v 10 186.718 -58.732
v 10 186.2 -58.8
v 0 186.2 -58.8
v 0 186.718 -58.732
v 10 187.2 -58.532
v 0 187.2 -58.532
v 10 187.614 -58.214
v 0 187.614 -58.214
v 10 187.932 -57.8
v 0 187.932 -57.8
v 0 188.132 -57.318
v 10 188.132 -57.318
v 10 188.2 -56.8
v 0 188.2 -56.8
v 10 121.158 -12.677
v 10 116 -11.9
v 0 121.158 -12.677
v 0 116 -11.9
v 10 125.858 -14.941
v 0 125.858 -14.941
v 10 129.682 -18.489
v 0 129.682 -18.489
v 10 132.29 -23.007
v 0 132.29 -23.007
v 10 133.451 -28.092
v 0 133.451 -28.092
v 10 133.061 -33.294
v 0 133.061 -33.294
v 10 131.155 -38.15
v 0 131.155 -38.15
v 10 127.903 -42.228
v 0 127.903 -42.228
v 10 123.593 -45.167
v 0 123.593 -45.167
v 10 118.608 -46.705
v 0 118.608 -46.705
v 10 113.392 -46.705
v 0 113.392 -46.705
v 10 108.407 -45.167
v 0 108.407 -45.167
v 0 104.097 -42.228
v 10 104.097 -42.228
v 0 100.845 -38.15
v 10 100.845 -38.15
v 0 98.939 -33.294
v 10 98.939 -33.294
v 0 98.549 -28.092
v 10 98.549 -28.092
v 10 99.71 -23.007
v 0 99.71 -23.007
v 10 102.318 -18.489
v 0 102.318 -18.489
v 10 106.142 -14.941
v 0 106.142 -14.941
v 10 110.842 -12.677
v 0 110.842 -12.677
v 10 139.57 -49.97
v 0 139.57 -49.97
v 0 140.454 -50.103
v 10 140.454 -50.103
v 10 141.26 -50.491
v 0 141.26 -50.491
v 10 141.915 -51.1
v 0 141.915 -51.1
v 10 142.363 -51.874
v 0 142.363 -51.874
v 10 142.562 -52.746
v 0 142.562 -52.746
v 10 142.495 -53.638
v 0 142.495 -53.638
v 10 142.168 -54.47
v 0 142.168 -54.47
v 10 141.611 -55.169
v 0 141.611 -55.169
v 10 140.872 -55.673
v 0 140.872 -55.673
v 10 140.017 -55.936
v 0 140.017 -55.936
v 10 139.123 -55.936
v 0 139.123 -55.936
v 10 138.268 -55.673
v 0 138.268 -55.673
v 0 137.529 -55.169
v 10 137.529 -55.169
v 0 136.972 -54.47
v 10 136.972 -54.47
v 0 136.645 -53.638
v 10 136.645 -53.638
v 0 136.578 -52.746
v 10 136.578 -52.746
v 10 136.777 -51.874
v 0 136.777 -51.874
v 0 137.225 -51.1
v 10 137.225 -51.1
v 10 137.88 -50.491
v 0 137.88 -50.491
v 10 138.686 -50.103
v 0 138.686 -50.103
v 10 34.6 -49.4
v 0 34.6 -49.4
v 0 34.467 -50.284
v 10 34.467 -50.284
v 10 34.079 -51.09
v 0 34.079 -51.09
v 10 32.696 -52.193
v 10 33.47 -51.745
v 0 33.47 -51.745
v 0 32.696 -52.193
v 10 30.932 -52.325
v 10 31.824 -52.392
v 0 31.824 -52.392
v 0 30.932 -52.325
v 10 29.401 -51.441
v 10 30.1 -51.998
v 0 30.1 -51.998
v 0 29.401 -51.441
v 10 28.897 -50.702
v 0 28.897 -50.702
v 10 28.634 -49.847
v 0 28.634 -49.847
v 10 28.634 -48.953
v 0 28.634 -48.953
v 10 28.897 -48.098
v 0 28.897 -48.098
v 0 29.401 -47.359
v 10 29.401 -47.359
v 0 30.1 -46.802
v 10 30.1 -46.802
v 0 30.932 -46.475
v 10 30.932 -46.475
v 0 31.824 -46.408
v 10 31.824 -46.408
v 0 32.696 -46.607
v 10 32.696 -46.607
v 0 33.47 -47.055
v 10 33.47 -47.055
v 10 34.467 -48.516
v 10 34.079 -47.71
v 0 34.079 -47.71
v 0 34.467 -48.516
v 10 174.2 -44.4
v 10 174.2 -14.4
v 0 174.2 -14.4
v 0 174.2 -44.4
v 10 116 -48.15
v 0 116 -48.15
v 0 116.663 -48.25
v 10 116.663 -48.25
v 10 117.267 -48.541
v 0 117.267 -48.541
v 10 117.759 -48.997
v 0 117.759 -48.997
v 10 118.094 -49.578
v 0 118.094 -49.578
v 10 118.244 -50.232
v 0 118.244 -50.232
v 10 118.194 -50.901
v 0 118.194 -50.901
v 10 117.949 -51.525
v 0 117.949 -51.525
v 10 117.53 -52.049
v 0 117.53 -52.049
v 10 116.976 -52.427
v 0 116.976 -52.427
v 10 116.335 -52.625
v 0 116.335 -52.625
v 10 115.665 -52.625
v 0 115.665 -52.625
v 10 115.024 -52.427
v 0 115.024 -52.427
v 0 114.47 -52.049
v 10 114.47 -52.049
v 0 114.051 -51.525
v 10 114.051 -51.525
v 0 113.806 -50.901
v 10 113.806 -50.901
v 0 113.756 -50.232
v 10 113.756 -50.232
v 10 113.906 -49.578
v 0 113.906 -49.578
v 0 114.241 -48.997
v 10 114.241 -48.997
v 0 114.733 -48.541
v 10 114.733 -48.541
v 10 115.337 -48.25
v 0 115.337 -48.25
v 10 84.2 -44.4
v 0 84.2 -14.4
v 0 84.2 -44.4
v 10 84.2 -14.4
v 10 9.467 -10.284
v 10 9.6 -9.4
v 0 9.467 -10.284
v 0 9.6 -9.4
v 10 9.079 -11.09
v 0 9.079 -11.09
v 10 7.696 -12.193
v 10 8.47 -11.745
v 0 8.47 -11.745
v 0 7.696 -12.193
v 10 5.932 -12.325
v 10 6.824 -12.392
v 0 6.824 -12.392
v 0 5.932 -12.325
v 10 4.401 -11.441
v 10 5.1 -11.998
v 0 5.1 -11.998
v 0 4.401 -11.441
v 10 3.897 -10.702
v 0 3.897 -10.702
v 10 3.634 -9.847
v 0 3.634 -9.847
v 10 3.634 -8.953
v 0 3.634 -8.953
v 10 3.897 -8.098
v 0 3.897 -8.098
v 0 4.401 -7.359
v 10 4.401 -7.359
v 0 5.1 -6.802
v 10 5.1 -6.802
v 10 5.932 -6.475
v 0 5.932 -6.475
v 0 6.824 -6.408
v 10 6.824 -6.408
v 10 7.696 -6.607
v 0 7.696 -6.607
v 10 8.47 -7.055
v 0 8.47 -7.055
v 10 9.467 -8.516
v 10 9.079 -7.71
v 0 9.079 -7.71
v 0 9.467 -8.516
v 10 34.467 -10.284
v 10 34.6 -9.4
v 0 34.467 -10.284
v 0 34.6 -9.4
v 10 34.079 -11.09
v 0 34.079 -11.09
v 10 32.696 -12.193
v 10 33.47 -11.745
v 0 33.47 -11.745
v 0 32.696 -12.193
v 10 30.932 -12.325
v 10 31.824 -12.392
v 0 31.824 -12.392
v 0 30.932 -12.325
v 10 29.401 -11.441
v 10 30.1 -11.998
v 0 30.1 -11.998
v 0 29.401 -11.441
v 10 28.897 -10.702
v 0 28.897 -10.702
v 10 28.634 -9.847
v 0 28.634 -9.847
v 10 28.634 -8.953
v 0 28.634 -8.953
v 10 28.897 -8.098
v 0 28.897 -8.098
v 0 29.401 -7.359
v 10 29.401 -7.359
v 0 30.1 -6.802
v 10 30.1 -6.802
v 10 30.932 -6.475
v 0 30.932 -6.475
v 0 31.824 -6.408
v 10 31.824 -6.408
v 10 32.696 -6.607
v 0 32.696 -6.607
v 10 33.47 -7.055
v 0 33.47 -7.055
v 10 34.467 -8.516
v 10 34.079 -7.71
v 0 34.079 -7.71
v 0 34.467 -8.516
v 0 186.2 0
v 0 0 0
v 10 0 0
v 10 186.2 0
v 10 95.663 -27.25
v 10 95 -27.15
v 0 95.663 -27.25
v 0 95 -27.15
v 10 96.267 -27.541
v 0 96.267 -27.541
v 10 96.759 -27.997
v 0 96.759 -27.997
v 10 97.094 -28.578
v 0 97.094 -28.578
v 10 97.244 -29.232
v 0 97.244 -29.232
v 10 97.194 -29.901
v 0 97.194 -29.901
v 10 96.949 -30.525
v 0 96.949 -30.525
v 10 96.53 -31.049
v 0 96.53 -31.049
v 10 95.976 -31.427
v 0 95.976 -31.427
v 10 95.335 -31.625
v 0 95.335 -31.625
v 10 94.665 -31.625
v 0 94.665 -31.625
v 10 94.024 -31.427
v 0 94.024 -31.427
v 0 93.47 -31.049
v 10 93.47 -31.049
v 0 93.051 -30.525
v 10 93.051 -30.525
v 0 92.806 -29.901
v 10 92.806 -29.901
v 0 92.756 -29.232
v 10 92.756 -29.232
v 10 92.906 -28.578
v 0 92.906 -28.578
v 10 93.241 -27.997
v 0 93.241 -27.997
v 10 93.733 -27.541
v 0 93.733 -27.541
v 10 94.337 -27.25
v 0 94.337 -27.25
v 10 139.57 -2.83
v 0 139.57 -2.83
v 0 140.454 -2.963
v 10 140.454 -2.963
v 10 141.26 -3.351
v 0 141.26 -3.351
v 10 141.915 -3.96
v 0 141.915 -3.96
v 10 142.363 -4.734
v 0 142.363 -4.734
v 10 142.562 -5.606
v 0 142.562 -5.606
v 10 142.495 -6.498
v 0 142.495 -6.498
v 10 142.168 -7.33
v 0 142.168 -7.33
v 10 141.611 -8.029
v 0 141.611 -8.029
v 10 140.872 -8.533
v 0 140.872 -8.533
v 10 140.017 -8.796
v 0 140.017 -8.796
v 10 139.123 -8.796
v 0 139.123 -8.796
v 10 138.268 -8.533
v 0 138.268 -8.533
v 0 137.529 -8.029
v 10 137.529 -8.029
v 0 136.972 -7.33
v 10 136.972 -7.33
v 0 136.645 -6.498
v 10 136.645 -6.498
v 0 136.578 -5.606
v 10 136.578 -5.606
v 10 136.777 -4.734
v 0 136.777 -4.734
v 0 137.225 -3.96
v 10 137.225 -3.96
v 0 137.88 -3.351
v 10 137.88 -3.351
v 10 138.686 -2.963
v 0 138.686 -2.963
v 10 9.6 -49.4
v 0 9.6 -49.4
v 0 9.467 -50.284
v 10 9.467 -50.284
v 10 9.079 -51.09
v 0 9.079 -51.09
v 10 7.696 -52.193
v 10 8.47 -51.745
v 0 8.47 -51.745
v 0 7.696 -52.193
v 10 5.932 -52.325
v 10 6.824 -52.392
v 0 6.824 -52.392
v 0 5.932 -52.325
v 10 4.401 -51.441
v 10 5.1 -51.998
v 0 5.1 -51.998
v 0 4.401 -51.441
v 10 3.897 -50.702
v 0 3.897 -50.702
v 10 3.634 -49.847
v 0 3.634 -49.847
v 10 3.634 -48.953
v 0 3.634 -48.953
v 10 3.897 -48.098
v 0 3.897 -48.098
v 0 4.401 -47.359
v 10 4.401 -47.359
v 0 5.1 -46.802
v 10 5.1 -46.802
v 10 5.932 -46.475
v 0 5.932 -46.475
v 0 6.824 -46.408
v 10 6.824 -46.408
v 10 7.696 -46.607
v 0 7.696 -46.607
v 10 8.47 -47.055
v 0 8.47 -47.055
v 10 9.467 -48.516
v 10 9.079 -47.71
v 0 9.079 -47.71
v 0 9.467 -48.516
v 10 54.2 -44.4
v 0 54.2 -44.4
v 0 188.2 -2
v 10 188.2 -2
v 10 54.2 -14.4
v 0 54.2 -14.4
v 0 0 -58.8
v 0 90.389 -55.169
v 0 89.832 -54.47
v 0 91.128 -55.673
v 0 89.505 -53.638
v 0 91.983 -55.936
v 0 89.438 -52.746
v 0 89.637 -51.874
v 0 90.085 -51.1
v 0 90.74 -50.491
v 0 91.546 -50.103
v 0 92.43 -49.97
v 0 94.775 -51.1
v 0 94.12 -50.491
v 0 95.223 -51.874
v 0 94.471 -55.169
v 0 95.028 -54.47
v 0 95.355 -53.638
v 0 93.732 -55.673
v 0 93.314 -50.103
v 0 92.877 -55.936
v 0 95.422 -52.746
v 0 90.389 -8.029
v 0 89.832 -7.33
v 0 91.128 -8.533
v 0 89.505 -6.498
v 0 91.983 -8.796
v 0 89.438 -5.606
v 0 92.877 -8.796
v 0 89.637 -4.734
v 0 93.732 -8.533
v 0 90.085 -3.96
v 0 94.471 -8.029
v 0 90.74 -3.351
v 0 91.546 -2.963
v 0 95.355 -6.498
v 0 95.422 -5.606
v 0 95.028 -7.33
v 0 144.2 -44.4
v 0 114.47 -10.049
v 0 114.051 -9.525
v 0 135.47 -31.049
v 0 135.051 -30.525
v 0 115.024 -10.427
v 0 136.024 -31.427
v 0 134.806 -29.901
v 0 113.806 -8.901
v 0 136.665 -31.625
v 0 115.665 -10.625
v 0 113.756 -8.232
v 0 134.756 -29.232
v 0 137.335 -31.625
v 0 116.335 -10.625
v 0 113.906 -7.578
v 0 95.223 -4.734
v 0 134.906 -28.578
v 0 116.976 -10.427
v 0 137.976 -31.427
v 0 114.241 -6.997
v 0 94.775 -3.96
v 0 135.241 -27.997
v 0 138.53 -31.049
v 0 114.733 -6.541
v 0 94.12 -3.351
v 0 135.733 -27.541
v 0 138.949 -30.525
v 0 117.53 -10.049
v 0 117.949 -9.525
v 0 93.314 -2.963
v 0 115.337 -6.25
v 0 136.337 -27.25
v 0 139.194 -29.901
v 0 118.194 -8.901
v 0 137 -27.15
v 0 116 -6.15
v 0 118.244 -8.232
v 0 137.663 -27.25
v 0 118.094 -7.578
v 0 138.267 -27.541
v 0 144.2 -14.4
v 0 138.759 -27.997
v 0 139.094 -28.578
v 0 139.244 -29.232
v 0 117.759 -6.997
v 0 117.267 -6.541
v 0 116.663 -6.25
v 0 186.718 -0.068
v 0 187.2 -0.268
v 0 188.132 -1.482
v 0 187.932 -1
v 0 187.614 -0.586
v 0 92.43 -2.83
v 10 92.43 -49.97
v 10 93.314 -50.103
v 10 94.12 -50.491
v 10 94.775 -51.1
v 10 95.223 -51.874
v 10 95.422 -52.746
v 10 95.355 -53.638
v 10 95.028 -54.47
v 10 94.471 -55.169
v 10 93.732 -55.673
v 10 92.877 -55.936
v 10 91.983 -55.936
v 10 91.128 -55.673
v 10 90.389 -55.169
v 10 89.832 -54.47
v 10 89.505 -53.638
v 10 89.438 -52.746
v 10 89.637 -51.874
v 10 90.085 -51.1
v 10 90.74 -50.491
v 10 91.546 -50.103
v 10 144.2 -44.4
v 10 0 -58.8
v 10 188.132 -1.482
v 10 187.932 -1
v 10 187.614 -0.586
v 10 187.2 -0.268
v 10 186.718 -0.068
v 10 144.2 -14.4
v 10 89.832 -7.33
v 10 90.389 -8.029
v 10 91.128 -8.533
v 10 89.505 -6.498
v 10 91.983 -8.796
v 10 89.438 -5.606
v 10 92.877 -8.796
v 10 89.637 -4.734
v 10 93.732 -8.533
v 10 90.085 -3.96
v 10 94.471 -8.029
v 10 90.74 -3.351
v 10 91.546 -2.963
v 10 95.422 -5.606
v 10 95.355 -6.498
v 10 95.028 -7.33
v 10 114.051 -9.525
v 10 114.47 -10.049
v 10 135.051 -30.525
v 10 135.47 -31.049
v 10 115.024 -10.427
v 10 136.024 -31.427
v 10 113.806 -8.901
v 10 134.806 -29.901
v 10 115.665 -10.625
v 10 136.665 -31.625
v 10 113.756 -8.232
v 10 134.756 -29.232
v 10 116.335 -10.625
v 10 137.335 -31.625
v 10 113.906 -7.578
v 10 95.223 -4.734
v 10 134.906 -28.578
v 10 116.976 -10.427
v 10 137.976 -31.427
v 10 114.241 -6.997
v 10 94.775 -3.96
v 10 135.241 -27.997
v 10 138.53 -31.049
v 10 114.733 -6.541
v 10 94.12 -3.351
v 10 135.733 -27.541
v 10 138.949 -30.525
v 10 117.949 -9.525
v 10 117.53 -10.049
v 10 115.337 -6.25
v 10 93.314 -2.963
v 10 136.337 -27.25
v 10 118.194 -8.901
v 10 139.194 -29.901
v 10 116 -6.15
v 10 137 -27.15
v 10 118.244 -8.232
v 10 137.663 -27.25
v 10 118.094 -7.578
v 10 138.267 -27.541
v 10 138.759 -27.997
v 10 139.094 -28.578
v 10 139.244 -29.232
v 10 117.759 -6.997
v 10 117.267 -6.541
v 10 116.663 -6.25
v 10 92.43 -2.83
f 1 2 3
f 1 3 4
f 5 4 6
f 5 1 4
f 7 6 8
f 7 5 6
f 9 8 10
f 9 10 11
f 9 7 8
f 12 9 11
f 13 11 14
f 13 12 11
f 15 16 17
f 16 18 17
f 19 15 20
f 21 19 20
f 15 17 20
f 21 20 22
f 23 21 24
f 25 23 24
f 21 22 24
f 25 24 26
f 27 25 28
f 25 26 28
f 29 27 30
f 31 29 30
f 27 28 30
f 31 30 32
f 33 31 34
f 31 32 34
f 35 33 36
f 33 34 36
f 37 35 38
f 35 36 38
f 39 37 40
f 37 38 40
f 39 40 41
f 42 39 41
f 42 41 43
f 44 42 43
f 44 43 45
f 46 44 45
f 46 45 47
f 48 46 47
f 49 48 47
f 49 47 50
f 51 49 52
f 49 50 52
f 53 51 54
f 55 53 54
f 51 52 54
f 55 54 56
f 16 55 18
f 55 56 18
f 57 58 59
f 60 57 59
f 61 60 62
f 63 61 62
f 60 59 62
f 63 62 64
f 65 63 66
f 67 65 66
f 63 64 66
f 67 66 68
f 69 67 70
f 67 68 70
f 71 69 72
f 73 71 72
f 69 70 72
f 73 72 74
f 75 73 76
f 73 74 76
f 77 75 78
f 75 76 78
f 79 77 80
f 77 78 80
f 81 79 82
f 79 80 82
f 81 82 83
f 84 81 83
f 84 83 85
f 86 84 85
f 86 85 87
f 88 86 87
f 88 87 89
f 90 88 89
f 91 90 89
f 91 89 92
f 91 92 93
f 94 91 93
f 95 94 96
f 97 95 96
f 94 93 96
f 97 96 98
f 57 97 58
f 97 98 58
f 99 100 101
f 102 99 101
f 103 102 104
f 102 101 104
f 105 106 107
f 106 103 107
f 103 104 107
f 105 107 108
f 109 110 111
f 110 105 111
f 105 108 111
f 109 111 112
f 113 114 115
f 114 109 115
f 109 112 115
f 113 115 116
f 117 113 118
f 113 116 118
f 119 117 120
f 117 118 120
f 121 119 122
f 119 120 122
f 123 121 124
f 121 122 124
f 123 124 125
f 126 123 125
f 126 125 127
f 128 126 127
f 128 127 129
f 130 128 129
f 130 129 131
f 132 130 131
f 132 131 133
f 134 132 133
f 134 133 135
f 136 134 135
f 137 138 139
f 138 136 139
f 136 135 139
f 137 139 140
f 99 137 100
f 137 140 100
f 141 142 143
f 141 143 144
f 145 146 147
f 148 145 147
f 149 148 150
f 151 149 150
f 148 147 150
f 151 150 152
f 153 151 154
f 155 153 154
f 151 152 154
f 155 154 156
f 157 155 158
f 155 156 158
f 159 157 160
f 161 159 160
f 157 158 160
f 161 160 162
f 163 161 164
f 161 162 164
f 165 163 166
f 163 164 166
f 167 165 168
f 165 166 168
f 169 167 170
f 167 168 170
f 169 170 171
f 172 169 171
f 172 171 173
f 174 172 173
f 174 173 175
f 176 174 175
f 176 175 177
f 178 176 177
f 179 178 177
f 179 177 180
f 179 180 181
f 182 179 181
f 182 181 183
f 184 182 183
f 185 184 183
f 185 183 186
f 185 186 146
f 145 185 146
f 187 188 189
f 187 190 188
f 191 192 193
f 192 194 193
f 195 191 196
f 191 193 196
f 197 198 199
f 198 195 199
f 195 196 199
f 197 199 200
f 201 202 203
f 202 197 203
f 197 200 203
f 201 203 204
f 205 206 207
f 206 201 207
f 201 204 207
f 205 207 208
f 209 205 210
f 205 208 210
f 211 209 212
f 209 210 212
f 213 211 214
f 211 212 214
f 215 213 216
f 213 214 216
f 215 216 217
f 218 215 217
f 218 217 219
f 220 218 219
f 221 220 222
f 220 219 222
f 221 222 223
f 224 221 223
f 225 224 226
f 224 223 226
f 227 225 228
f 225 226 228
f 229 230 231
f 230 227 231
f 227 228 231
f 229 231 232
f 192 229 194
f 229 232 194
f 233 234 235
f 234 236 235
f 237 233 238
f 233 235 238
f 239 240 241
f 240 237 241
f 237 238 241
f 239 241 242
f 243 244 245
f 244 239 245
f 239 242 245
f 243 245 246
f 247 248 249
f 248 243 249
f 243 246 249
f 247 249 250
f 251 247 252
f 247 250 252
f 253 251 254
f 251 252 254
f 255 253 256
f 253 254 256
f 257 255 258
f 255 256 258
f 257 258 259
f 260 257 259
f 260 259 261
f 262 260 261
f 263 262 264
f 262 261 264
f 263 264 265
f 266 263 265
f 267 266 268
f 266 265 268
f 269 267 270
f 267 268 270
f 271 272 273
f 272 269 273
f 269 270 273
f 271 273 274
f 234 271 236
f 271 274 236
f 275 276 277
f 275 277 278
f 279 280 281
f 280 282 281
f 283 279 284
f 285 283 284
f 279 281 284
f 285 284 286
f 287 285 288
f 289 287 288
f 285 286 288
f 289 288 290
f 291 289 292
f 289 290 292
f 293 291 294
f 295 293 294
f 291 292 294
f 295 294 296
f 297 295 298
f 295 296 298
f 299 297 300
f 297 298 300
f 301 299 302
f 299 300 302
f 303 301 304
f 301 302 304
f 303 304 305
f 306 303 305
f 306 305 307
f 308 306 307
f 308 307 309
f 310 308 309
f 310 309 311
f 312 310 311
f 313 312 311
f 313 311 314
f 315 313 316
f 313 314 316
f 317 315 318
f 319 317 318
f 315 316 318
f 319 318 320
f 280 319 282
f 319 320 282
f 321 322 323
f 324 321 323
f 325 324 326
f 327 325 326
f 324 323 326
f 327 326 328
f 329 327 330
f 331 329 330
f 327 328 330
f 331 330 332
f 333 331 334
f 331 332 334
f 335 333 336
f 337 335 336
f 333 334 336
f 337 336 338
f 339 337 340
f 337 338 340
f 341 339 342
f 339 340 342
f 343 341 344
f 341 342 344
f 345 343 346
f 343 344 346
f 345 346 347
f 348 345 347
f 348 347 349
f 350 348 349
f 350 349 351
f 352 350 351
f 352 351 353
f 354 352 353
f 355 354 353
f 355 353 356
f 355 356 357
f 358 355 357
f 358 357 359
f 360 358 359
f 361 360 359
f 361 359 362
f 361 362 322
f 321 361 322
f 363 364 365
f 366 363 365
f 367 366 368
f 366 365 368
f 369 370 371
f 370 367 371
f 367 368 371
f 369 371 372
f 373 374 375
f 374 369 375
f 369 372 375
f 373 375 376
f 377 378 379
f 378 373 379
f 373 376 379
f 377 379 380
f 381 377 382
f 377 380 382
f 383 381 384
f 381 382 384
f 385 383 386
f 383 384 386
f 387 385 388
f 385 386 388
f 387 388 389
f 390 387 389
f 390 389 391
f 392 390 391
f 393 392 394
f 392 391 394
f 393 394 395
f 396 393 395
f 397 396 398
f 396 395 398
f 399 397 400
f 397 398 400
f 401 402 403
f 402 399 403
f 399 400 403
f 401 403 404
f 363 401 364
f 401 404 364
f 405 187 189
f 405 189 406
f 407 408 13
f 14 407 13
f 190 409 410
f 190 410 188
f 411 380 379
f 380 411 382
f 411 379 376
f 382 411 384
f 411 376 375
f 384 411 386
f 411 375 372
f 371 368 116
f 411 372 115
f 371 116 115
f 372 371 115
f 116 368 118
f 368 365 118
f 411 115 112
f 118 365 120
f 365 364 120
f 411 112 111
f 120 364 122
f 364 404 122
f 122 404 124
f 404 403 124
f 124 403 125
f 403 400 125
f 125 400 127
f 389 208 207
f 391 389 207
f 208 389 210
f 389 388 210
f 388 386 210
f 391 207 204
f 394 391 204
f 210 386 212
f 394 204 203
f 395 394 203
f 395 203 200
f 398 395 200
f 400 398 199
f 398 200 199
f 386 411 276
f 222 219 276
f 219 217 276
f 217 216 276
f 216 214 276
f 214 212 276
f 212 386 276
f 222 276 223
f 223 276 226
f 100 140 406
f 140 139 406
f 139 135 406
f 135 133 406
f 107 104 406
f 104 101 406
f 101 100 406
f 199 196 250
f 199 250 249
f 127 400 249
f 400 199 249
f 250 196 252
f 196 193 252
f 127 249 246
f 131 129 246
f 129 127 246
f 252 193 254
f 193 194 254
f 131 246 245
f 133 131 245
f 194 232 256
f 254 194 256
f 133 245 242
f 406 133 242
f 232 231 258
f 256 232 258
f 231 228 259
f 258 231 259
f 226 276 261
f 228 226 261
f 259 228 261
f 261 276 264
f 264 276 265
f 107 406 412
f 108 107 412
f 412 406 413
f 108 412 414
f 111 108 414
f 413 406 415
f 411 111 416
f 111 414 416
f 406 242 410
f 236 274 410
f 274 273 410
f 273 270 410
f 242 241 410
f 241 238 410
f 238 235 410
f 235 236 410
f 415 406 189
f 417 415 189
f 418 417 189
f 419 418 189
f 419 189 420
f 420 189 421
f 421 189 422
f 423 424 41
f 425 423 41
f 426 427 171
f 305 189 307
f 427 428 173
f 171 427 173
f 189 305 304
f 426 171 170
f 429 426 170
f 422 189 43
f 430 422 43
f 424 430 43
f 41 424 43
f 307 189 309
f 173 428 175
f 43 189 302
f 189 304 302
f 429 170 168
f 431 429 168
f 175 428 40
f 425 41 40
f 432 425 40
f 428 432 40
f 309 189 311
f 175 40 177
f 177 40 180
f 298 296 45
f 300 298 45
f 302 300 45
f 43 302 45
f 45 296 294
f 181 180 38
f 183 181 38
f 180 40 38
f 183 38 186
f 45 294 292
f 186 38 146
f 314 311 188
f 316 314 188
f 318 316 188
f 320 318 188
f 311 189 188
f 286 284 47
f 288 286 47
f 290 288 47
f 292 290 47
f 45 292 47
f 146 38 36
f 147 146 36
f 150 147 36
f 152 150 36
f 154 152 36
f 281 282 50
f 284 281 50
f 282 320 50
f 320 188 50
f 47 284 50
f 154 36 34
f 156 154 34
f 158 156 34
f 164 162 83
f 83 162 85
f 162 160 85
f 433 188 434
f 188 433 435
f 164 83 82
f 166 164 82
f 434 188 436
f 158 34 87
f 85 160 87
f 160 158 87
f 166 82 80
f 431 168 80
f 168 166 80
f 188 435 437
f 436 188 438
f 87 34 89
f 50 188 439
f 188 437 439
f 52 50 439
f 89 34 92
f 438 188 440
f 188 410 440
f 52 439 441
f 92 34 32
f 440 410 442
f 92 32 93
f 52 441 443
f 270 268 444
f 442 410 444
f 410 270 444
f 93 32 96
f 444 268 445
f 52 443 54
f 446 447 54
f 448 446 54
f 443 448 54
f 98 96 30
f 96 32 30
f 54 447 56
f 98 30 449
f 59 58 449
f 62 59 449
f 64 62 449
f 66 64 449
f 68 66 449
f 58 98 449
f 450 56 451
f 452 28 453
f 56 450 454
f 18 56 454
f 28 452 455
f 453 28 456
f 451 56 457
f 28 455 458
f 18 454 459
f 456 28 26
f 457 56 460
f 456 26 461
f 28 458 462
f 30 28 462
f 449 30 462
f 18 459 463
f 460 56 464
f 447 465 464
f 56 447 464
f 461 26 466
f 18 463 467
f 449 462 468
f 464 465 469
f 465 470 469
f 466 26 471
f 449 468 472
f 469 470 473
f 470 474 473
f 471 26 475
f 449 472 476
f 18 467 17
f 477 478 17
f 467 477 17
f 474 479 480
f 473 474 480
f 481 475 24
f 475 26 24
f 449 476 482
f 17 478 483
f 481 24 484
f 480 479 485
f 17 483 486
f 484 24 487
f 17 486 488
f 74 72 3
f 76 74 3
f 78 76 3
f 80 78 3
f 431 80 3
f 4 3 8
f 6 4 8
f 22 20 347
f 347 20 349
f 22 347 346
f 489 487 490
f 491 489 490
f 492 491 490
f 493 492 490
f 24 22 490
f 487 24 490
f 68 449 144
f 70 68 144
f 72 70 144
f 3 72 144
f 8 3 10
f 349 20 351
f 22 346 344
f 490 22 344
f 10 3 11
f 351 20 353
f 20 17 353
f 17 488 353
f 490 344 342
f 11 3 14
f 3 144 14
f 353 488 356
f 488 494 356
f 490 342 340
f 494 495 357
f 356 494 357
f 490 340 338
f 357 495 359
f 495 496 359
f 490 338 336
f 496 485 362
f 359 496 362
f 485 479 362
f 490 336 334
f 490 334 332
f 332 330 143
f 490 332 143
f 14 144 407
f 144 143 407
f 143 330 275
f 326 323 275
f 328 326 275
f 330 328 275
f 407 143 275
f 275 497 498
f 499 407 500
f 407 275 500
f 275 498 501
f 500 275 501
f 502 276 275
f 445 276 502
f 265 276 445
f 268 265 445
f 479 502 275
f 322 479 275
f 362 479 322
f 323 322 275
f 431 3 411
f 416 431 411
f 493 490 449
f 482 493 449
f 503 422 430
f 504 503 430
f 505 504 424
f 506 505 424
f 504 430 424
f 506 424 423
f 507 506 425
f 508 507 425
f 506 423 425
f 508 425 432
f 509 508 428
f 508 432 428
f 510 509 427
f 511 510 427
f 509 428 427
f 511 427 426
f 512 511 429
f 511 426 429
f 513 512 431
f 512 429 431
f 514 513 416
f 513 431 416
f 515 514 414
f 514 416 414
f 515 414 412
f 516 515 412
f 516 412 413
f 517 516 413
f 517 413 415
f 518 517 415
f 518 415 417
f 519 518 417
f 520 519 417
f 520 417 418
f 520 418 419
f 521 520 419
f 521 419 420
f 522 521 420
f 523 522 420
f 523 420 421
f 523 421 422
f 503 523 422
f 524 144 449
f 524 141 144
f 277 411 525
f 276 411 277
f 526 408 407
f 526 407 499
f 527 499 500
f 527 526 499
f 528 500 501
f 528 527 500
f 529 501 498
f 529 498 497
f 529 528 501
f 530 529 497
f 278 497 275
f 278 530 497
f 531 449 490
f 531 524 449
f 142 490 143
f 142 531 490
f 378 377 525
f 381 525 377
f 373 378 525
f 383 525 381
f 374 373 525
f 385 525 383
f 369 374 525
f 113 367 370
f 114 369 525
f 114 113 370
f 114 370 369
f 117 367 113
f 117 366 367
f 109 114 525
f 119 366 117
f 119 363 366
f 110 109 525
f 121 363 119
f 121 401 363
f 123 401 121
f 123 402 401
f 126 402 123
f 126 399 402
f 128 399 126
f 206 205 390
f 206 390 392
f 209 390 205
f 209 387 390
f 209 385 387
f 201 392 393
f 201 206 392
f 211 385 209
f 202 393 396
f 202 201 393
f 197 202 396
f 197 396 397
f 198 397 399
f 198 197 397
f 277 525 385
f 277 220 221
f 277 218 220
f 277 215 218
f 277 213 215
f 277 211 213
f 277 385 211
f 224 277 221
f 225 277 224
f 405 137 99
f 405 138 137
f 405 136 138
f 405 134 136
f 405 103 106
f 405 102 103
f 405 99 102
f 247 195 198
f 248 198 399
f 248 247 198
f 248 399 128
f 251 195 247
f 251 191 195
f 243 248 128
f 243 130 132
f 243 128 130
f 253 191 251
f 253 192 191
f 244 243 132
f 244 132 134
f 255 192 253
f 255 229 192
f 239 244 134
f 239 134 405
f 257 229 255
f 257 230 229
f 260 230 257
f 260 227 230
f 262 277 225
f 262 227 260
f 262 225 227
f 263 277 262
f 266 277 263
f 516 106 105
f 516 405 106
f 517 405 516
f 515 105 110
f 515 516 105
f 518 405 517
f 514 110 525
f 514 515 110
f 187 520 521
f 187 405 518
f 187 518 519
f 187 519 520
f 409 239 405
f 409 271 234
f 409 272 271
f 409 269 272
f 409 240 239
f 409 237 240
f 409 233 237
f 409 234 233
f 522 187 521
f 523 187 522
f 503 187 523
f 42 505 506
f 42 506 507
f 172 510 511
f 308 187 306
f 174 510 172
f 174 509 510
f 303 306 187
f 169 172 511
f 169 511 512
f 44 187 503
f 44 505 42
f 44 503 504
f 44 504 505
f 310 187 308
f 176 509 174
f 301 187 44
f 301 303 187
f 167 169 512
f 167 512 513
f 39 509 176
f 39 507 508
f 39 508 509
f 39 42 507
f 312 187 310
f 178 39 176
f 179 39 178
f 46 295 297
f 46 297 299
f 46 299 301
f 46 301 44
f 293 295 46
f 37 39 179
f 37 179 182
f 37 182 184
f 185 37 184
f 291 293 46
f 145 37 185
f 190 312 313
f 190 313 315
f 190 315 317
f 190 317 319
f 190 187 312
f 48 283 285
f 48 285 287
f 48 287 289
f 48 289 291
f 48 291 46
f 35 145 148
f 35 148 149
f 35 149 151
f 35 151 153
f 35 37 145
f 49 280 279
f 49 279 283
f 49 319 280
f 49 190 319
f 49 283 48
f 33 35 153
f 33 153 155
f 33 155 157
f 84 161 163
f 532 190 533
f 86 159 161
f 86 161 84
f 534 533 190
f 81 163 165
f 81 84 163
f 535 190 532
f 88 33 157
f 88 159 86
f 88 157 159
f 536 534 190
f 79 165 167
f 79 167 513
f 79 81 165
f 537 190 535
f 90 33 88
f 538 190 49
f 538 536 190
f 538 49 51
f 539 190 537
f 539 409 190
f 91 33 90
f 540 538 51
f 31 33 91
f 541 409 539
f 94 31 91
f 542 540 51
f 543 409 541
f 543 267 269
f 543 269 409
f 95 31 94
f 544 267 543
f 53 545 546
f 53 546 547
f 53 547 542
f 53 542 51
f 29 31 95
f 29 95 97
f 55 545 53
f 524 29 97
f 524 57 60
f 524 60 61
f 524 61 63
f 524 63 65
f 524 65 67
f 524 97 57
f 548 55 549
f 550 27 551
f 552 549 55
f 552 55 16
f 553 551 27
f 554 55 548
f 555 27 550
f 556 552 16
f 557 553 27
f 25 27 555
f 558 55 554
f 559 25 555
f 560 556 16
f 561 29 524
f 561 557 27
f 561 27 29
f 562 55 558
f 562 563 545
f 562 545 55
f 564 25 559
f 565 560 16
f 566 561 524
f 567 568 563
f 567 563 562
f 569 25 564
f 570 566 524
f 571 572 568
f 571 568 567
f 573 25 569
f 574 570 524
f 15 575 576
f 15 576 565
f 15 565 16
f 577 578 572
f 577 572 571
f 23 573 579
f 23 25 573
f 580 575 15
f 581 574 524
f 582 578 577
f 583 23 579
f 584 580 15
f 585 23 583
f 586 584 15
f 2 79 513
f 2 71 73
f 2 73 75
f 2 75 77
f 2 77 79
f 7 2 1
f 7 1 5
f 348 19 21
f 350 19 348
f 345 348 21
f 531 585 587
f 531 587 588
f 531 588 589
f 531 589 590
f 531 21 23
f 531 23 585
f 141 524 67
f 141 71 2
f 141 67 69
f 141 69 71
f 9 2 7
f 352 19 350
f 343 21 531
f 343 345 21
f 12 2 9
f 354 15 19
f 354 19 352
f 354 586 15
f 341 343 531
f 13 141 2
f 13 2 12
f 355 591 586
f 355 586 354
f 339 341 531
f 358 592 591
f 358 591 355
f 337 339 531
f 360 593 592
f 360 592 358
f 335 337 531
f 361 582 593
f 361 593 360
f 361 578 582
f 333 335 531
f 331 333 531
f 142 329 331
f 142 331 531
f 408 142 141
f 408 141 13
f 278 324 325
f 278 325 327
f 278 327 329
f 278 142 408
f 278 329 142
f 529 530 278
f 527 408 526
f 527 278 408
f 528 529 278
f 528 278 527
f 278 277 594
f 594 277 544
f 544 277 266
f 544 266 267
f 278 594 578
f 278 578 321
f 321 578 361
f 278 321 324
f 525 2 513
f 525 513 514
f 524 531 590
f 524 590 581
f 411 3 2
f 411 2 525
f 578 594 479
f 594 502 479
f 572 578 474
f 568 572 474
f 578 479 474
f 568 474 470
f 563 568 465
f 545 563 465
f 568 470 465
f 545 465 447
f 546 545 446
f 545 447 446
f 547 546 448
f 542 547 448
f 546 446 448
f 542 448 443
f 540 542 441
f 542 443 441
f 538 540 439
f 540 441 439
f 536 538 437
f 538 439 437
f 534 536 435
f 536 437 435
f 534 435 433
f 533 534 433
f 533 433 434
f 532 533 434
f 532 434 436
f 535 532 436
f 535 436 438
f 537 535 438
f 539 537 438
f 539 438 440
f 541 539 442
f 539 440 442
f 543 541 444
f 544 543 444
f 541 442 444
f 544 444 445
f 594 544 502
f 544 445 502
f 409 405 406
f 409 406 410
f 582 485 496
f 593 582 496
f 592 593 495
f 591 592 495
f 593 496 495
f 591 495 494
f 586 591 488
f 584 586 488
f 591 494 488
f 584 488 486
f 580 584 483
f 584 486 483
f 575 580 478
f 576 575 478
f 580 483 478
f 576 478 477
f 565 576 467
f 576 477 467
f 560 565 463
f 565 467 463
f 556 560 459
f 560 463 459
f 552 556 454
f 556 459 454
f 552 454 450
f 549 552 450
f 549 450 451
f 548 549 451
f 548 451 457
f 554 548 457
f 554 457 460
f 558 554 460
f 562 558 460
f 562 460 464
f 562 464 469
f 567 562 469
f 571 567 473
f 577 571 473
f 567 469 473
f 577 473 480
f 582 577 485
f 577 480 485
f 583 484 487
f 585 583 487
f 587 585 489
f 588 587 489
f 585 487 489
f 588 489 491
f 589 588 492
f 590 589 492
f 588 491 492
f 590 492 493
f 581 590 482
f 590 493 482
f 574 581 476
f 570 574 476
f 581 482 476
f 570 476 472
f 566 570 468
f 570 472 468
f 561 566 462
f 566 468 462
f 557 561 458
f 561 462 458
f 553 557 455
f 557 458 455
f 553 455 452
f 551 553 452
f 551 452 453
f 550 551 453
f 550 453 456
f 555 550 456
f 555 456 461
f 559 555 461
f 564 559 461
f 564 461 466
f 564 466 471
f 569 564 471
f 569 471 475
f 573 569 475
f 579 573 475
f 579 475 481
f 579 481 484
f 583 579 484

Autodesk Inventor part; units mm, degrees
ref_plane "YZ Plane" through (0, 0, 0) normal (1, 0, 0) x (0, 1, 0)
ref_plane "XZ Plane" through (0, 0, 0) normal (0, 1, 0) x (-1, 0, 0)
ref_plane "XY Plane" through (0, 0, 0) normal (0, 0, 1) x (1, 0, 0)
sketch "Sketch1" plane through (0, 0, 0) normal (1, 0, 0) x (0, 1, 0)
  circle A0 centre (31.6, -9.4) radius 3
  circle A1 centre (31.6, -49.4) radius 3
  circle A2 centre (6.6, -9.4) radius 3
  circle A3 centre (6.6, -49.4) radius 3
  line L0 (31.6, -9.4) -> (6.6, -9.4) construction
  line L1 (6.6, -9.4) -> (6.6, -49.4) construction
  line L2 (6.6, -49.4) -> (31.6, -49.4) construction
  line L3 (31.6, -49.4) -> (31.6, -9.4) construction
  line L4 (0, 0) -> (38.2, 0)
  line L5 (38.2, 0) -> (38.2, -58.8)
  line L6 (38.2, -58.8) -> (0, -58.8)
  line L7 (0, -58.8) -> (0, 0)
  point P0 (31.6, -29.4)
  point P1 (38.2, -29.4)
  point P2 (19.1, -49.4)
  point P3 (19.1, -58.8)
  dimension "d0" = 6
  dimension "d1" = 25
  dimension "d2" = 40
  dimension "d3" = 58.8
  dimension "d4" = 38.2
extrude "Extrusion1" add sketch "Sketch1" along normal blind 10
sketch "Sketch3" plane through (10, 0, 0) normal (1, 0, 0) x (0, 0, -1)
  line L0 (58.8, 38.2) -> (0, 38.2) projected
  line L1 (0, 38.2) -> (0, 186.2)
  line L2 (2, 188.2) -> (56.8, 188.2)
  line L3 (58.8, 186.2) -> (58.8, 38.2)
  arc A0 (2, 188.2) -> (0, 186.2) centre (2, 186.2) ccw
  arc A1 (58.8, 186.2) -> (56.8, 188.2) centre (56.8, 186.2) ccw
  line L4 (14.4, 174.2) -> (44.4, 174.2)
  line L5 (44.4, 174.2) -> (44.4, 144.2)
  line L6 (44.4, 144.2) -> (14.4, 144.2)
  line L7 (14.4, 144.2) -> (14.4, 174.2)
  line L8 (14.4, 84.2) -> (44.4, 84.2)
  line L9 (44.4, 84.2) -> (44.4, 54.2)
  line L10 (44.4, 54.2) -> (14.4, 54.2)
  line L11 (14.4, 54.2) -> (14.4, 84.2)
  point P0 (0, 0)
  point P1 (29.4, 38.2)
  point P2 (29.4, 174.2)
  point P3 (29.4, 84.2)
  point P4 (29.4, 188.2)
  point P5 (29.4, 38.2)
  point P6 (29.4, 54.2)
  point P7 (29.4, 38.2)
  dimension "d7" = 150
  dimension "d8" = 2
  dimension "d9" = 30
  dimension "d12" = 60
  dimension "d13" = 16
extrude "Extrusion2" add sketch "Sketch3" against normal blind 10
sketch "Sketch4" plane through (0, 0, 0) normal (-1, 0, 0) x (0, 0, 1)
  circle A0 centre (-52.97, 139.57) radius 3
  circle A1 centre (-5.83, 139.57) radius 3
  circle A2 centre (-52.97, 92.43) radius 3
  circle A3 centre (-5.83, 92.43) radius 3
  line L0 (-52.97, 92.43) -> (-5.83, 92.43) construction
  line L1 (-5.83, 92.43) -> (-5.83, 139.57) construction
  line L2 (-5.83, 139.57) -> (-52.97, 139.57) construction
  line L3 (-52.97, 139.57) -> (-52.97, 92.43) construction
  line L4 (-57.6, 87.8) -> (-1.2, 87.8) construction
  line L5 (-1.2, 87.8) -> (-1.2, 144.2) construction
  line L6 (-1.2, 144.2) -> (-57.6, 144.2) construction
  line L7 (-57.6, 144.2) -> (-57.6, 87.8) construction
  line L8 (-14.4, 144.2) -> (-44.4, 144.2) construction
  circle A4 centre (-29.4, 116) radius 17.5
  line L9 (-8.4, 116) -> (-29.4, 137) construction
  line L10 (-29.4, 137) -> (-50.4, 116) construction
  line L11 (-50.4, 116) -> (-29.4, 95) construction
  line L12 (-29.4, 95) -> (-8.4, 116) construction
  circle A5 centre (-29.4, 137) radius 2.25
  circle A6 centre (-50.4, 116) radius 2.25
  circle A7 centre (-8.4, 116) radius 2.25
  circle A8 centre (-29.4, 95) radius 2.25
  point P0 (0, 0)
  point P1 (-1.2, 116)
  point P2 (-5.83, 116)
  point P3 (-29.4, 139.57)
  point P4 (-29.4, 144.2)
  point P5 (-29.4, 144.2)
  dimension "d16" = 47.14
  dimension "d17" = 6
  dimension "d18" = 56.4
  dimension "d19" = 35
  dimension "d22" = 42
  dimension "d23" = 4.5
extrude "Extrusion3" cut sketch "Sketch4" against normal up to surface (10 mm away)
properties part number "Y_Gantry_Connector"
